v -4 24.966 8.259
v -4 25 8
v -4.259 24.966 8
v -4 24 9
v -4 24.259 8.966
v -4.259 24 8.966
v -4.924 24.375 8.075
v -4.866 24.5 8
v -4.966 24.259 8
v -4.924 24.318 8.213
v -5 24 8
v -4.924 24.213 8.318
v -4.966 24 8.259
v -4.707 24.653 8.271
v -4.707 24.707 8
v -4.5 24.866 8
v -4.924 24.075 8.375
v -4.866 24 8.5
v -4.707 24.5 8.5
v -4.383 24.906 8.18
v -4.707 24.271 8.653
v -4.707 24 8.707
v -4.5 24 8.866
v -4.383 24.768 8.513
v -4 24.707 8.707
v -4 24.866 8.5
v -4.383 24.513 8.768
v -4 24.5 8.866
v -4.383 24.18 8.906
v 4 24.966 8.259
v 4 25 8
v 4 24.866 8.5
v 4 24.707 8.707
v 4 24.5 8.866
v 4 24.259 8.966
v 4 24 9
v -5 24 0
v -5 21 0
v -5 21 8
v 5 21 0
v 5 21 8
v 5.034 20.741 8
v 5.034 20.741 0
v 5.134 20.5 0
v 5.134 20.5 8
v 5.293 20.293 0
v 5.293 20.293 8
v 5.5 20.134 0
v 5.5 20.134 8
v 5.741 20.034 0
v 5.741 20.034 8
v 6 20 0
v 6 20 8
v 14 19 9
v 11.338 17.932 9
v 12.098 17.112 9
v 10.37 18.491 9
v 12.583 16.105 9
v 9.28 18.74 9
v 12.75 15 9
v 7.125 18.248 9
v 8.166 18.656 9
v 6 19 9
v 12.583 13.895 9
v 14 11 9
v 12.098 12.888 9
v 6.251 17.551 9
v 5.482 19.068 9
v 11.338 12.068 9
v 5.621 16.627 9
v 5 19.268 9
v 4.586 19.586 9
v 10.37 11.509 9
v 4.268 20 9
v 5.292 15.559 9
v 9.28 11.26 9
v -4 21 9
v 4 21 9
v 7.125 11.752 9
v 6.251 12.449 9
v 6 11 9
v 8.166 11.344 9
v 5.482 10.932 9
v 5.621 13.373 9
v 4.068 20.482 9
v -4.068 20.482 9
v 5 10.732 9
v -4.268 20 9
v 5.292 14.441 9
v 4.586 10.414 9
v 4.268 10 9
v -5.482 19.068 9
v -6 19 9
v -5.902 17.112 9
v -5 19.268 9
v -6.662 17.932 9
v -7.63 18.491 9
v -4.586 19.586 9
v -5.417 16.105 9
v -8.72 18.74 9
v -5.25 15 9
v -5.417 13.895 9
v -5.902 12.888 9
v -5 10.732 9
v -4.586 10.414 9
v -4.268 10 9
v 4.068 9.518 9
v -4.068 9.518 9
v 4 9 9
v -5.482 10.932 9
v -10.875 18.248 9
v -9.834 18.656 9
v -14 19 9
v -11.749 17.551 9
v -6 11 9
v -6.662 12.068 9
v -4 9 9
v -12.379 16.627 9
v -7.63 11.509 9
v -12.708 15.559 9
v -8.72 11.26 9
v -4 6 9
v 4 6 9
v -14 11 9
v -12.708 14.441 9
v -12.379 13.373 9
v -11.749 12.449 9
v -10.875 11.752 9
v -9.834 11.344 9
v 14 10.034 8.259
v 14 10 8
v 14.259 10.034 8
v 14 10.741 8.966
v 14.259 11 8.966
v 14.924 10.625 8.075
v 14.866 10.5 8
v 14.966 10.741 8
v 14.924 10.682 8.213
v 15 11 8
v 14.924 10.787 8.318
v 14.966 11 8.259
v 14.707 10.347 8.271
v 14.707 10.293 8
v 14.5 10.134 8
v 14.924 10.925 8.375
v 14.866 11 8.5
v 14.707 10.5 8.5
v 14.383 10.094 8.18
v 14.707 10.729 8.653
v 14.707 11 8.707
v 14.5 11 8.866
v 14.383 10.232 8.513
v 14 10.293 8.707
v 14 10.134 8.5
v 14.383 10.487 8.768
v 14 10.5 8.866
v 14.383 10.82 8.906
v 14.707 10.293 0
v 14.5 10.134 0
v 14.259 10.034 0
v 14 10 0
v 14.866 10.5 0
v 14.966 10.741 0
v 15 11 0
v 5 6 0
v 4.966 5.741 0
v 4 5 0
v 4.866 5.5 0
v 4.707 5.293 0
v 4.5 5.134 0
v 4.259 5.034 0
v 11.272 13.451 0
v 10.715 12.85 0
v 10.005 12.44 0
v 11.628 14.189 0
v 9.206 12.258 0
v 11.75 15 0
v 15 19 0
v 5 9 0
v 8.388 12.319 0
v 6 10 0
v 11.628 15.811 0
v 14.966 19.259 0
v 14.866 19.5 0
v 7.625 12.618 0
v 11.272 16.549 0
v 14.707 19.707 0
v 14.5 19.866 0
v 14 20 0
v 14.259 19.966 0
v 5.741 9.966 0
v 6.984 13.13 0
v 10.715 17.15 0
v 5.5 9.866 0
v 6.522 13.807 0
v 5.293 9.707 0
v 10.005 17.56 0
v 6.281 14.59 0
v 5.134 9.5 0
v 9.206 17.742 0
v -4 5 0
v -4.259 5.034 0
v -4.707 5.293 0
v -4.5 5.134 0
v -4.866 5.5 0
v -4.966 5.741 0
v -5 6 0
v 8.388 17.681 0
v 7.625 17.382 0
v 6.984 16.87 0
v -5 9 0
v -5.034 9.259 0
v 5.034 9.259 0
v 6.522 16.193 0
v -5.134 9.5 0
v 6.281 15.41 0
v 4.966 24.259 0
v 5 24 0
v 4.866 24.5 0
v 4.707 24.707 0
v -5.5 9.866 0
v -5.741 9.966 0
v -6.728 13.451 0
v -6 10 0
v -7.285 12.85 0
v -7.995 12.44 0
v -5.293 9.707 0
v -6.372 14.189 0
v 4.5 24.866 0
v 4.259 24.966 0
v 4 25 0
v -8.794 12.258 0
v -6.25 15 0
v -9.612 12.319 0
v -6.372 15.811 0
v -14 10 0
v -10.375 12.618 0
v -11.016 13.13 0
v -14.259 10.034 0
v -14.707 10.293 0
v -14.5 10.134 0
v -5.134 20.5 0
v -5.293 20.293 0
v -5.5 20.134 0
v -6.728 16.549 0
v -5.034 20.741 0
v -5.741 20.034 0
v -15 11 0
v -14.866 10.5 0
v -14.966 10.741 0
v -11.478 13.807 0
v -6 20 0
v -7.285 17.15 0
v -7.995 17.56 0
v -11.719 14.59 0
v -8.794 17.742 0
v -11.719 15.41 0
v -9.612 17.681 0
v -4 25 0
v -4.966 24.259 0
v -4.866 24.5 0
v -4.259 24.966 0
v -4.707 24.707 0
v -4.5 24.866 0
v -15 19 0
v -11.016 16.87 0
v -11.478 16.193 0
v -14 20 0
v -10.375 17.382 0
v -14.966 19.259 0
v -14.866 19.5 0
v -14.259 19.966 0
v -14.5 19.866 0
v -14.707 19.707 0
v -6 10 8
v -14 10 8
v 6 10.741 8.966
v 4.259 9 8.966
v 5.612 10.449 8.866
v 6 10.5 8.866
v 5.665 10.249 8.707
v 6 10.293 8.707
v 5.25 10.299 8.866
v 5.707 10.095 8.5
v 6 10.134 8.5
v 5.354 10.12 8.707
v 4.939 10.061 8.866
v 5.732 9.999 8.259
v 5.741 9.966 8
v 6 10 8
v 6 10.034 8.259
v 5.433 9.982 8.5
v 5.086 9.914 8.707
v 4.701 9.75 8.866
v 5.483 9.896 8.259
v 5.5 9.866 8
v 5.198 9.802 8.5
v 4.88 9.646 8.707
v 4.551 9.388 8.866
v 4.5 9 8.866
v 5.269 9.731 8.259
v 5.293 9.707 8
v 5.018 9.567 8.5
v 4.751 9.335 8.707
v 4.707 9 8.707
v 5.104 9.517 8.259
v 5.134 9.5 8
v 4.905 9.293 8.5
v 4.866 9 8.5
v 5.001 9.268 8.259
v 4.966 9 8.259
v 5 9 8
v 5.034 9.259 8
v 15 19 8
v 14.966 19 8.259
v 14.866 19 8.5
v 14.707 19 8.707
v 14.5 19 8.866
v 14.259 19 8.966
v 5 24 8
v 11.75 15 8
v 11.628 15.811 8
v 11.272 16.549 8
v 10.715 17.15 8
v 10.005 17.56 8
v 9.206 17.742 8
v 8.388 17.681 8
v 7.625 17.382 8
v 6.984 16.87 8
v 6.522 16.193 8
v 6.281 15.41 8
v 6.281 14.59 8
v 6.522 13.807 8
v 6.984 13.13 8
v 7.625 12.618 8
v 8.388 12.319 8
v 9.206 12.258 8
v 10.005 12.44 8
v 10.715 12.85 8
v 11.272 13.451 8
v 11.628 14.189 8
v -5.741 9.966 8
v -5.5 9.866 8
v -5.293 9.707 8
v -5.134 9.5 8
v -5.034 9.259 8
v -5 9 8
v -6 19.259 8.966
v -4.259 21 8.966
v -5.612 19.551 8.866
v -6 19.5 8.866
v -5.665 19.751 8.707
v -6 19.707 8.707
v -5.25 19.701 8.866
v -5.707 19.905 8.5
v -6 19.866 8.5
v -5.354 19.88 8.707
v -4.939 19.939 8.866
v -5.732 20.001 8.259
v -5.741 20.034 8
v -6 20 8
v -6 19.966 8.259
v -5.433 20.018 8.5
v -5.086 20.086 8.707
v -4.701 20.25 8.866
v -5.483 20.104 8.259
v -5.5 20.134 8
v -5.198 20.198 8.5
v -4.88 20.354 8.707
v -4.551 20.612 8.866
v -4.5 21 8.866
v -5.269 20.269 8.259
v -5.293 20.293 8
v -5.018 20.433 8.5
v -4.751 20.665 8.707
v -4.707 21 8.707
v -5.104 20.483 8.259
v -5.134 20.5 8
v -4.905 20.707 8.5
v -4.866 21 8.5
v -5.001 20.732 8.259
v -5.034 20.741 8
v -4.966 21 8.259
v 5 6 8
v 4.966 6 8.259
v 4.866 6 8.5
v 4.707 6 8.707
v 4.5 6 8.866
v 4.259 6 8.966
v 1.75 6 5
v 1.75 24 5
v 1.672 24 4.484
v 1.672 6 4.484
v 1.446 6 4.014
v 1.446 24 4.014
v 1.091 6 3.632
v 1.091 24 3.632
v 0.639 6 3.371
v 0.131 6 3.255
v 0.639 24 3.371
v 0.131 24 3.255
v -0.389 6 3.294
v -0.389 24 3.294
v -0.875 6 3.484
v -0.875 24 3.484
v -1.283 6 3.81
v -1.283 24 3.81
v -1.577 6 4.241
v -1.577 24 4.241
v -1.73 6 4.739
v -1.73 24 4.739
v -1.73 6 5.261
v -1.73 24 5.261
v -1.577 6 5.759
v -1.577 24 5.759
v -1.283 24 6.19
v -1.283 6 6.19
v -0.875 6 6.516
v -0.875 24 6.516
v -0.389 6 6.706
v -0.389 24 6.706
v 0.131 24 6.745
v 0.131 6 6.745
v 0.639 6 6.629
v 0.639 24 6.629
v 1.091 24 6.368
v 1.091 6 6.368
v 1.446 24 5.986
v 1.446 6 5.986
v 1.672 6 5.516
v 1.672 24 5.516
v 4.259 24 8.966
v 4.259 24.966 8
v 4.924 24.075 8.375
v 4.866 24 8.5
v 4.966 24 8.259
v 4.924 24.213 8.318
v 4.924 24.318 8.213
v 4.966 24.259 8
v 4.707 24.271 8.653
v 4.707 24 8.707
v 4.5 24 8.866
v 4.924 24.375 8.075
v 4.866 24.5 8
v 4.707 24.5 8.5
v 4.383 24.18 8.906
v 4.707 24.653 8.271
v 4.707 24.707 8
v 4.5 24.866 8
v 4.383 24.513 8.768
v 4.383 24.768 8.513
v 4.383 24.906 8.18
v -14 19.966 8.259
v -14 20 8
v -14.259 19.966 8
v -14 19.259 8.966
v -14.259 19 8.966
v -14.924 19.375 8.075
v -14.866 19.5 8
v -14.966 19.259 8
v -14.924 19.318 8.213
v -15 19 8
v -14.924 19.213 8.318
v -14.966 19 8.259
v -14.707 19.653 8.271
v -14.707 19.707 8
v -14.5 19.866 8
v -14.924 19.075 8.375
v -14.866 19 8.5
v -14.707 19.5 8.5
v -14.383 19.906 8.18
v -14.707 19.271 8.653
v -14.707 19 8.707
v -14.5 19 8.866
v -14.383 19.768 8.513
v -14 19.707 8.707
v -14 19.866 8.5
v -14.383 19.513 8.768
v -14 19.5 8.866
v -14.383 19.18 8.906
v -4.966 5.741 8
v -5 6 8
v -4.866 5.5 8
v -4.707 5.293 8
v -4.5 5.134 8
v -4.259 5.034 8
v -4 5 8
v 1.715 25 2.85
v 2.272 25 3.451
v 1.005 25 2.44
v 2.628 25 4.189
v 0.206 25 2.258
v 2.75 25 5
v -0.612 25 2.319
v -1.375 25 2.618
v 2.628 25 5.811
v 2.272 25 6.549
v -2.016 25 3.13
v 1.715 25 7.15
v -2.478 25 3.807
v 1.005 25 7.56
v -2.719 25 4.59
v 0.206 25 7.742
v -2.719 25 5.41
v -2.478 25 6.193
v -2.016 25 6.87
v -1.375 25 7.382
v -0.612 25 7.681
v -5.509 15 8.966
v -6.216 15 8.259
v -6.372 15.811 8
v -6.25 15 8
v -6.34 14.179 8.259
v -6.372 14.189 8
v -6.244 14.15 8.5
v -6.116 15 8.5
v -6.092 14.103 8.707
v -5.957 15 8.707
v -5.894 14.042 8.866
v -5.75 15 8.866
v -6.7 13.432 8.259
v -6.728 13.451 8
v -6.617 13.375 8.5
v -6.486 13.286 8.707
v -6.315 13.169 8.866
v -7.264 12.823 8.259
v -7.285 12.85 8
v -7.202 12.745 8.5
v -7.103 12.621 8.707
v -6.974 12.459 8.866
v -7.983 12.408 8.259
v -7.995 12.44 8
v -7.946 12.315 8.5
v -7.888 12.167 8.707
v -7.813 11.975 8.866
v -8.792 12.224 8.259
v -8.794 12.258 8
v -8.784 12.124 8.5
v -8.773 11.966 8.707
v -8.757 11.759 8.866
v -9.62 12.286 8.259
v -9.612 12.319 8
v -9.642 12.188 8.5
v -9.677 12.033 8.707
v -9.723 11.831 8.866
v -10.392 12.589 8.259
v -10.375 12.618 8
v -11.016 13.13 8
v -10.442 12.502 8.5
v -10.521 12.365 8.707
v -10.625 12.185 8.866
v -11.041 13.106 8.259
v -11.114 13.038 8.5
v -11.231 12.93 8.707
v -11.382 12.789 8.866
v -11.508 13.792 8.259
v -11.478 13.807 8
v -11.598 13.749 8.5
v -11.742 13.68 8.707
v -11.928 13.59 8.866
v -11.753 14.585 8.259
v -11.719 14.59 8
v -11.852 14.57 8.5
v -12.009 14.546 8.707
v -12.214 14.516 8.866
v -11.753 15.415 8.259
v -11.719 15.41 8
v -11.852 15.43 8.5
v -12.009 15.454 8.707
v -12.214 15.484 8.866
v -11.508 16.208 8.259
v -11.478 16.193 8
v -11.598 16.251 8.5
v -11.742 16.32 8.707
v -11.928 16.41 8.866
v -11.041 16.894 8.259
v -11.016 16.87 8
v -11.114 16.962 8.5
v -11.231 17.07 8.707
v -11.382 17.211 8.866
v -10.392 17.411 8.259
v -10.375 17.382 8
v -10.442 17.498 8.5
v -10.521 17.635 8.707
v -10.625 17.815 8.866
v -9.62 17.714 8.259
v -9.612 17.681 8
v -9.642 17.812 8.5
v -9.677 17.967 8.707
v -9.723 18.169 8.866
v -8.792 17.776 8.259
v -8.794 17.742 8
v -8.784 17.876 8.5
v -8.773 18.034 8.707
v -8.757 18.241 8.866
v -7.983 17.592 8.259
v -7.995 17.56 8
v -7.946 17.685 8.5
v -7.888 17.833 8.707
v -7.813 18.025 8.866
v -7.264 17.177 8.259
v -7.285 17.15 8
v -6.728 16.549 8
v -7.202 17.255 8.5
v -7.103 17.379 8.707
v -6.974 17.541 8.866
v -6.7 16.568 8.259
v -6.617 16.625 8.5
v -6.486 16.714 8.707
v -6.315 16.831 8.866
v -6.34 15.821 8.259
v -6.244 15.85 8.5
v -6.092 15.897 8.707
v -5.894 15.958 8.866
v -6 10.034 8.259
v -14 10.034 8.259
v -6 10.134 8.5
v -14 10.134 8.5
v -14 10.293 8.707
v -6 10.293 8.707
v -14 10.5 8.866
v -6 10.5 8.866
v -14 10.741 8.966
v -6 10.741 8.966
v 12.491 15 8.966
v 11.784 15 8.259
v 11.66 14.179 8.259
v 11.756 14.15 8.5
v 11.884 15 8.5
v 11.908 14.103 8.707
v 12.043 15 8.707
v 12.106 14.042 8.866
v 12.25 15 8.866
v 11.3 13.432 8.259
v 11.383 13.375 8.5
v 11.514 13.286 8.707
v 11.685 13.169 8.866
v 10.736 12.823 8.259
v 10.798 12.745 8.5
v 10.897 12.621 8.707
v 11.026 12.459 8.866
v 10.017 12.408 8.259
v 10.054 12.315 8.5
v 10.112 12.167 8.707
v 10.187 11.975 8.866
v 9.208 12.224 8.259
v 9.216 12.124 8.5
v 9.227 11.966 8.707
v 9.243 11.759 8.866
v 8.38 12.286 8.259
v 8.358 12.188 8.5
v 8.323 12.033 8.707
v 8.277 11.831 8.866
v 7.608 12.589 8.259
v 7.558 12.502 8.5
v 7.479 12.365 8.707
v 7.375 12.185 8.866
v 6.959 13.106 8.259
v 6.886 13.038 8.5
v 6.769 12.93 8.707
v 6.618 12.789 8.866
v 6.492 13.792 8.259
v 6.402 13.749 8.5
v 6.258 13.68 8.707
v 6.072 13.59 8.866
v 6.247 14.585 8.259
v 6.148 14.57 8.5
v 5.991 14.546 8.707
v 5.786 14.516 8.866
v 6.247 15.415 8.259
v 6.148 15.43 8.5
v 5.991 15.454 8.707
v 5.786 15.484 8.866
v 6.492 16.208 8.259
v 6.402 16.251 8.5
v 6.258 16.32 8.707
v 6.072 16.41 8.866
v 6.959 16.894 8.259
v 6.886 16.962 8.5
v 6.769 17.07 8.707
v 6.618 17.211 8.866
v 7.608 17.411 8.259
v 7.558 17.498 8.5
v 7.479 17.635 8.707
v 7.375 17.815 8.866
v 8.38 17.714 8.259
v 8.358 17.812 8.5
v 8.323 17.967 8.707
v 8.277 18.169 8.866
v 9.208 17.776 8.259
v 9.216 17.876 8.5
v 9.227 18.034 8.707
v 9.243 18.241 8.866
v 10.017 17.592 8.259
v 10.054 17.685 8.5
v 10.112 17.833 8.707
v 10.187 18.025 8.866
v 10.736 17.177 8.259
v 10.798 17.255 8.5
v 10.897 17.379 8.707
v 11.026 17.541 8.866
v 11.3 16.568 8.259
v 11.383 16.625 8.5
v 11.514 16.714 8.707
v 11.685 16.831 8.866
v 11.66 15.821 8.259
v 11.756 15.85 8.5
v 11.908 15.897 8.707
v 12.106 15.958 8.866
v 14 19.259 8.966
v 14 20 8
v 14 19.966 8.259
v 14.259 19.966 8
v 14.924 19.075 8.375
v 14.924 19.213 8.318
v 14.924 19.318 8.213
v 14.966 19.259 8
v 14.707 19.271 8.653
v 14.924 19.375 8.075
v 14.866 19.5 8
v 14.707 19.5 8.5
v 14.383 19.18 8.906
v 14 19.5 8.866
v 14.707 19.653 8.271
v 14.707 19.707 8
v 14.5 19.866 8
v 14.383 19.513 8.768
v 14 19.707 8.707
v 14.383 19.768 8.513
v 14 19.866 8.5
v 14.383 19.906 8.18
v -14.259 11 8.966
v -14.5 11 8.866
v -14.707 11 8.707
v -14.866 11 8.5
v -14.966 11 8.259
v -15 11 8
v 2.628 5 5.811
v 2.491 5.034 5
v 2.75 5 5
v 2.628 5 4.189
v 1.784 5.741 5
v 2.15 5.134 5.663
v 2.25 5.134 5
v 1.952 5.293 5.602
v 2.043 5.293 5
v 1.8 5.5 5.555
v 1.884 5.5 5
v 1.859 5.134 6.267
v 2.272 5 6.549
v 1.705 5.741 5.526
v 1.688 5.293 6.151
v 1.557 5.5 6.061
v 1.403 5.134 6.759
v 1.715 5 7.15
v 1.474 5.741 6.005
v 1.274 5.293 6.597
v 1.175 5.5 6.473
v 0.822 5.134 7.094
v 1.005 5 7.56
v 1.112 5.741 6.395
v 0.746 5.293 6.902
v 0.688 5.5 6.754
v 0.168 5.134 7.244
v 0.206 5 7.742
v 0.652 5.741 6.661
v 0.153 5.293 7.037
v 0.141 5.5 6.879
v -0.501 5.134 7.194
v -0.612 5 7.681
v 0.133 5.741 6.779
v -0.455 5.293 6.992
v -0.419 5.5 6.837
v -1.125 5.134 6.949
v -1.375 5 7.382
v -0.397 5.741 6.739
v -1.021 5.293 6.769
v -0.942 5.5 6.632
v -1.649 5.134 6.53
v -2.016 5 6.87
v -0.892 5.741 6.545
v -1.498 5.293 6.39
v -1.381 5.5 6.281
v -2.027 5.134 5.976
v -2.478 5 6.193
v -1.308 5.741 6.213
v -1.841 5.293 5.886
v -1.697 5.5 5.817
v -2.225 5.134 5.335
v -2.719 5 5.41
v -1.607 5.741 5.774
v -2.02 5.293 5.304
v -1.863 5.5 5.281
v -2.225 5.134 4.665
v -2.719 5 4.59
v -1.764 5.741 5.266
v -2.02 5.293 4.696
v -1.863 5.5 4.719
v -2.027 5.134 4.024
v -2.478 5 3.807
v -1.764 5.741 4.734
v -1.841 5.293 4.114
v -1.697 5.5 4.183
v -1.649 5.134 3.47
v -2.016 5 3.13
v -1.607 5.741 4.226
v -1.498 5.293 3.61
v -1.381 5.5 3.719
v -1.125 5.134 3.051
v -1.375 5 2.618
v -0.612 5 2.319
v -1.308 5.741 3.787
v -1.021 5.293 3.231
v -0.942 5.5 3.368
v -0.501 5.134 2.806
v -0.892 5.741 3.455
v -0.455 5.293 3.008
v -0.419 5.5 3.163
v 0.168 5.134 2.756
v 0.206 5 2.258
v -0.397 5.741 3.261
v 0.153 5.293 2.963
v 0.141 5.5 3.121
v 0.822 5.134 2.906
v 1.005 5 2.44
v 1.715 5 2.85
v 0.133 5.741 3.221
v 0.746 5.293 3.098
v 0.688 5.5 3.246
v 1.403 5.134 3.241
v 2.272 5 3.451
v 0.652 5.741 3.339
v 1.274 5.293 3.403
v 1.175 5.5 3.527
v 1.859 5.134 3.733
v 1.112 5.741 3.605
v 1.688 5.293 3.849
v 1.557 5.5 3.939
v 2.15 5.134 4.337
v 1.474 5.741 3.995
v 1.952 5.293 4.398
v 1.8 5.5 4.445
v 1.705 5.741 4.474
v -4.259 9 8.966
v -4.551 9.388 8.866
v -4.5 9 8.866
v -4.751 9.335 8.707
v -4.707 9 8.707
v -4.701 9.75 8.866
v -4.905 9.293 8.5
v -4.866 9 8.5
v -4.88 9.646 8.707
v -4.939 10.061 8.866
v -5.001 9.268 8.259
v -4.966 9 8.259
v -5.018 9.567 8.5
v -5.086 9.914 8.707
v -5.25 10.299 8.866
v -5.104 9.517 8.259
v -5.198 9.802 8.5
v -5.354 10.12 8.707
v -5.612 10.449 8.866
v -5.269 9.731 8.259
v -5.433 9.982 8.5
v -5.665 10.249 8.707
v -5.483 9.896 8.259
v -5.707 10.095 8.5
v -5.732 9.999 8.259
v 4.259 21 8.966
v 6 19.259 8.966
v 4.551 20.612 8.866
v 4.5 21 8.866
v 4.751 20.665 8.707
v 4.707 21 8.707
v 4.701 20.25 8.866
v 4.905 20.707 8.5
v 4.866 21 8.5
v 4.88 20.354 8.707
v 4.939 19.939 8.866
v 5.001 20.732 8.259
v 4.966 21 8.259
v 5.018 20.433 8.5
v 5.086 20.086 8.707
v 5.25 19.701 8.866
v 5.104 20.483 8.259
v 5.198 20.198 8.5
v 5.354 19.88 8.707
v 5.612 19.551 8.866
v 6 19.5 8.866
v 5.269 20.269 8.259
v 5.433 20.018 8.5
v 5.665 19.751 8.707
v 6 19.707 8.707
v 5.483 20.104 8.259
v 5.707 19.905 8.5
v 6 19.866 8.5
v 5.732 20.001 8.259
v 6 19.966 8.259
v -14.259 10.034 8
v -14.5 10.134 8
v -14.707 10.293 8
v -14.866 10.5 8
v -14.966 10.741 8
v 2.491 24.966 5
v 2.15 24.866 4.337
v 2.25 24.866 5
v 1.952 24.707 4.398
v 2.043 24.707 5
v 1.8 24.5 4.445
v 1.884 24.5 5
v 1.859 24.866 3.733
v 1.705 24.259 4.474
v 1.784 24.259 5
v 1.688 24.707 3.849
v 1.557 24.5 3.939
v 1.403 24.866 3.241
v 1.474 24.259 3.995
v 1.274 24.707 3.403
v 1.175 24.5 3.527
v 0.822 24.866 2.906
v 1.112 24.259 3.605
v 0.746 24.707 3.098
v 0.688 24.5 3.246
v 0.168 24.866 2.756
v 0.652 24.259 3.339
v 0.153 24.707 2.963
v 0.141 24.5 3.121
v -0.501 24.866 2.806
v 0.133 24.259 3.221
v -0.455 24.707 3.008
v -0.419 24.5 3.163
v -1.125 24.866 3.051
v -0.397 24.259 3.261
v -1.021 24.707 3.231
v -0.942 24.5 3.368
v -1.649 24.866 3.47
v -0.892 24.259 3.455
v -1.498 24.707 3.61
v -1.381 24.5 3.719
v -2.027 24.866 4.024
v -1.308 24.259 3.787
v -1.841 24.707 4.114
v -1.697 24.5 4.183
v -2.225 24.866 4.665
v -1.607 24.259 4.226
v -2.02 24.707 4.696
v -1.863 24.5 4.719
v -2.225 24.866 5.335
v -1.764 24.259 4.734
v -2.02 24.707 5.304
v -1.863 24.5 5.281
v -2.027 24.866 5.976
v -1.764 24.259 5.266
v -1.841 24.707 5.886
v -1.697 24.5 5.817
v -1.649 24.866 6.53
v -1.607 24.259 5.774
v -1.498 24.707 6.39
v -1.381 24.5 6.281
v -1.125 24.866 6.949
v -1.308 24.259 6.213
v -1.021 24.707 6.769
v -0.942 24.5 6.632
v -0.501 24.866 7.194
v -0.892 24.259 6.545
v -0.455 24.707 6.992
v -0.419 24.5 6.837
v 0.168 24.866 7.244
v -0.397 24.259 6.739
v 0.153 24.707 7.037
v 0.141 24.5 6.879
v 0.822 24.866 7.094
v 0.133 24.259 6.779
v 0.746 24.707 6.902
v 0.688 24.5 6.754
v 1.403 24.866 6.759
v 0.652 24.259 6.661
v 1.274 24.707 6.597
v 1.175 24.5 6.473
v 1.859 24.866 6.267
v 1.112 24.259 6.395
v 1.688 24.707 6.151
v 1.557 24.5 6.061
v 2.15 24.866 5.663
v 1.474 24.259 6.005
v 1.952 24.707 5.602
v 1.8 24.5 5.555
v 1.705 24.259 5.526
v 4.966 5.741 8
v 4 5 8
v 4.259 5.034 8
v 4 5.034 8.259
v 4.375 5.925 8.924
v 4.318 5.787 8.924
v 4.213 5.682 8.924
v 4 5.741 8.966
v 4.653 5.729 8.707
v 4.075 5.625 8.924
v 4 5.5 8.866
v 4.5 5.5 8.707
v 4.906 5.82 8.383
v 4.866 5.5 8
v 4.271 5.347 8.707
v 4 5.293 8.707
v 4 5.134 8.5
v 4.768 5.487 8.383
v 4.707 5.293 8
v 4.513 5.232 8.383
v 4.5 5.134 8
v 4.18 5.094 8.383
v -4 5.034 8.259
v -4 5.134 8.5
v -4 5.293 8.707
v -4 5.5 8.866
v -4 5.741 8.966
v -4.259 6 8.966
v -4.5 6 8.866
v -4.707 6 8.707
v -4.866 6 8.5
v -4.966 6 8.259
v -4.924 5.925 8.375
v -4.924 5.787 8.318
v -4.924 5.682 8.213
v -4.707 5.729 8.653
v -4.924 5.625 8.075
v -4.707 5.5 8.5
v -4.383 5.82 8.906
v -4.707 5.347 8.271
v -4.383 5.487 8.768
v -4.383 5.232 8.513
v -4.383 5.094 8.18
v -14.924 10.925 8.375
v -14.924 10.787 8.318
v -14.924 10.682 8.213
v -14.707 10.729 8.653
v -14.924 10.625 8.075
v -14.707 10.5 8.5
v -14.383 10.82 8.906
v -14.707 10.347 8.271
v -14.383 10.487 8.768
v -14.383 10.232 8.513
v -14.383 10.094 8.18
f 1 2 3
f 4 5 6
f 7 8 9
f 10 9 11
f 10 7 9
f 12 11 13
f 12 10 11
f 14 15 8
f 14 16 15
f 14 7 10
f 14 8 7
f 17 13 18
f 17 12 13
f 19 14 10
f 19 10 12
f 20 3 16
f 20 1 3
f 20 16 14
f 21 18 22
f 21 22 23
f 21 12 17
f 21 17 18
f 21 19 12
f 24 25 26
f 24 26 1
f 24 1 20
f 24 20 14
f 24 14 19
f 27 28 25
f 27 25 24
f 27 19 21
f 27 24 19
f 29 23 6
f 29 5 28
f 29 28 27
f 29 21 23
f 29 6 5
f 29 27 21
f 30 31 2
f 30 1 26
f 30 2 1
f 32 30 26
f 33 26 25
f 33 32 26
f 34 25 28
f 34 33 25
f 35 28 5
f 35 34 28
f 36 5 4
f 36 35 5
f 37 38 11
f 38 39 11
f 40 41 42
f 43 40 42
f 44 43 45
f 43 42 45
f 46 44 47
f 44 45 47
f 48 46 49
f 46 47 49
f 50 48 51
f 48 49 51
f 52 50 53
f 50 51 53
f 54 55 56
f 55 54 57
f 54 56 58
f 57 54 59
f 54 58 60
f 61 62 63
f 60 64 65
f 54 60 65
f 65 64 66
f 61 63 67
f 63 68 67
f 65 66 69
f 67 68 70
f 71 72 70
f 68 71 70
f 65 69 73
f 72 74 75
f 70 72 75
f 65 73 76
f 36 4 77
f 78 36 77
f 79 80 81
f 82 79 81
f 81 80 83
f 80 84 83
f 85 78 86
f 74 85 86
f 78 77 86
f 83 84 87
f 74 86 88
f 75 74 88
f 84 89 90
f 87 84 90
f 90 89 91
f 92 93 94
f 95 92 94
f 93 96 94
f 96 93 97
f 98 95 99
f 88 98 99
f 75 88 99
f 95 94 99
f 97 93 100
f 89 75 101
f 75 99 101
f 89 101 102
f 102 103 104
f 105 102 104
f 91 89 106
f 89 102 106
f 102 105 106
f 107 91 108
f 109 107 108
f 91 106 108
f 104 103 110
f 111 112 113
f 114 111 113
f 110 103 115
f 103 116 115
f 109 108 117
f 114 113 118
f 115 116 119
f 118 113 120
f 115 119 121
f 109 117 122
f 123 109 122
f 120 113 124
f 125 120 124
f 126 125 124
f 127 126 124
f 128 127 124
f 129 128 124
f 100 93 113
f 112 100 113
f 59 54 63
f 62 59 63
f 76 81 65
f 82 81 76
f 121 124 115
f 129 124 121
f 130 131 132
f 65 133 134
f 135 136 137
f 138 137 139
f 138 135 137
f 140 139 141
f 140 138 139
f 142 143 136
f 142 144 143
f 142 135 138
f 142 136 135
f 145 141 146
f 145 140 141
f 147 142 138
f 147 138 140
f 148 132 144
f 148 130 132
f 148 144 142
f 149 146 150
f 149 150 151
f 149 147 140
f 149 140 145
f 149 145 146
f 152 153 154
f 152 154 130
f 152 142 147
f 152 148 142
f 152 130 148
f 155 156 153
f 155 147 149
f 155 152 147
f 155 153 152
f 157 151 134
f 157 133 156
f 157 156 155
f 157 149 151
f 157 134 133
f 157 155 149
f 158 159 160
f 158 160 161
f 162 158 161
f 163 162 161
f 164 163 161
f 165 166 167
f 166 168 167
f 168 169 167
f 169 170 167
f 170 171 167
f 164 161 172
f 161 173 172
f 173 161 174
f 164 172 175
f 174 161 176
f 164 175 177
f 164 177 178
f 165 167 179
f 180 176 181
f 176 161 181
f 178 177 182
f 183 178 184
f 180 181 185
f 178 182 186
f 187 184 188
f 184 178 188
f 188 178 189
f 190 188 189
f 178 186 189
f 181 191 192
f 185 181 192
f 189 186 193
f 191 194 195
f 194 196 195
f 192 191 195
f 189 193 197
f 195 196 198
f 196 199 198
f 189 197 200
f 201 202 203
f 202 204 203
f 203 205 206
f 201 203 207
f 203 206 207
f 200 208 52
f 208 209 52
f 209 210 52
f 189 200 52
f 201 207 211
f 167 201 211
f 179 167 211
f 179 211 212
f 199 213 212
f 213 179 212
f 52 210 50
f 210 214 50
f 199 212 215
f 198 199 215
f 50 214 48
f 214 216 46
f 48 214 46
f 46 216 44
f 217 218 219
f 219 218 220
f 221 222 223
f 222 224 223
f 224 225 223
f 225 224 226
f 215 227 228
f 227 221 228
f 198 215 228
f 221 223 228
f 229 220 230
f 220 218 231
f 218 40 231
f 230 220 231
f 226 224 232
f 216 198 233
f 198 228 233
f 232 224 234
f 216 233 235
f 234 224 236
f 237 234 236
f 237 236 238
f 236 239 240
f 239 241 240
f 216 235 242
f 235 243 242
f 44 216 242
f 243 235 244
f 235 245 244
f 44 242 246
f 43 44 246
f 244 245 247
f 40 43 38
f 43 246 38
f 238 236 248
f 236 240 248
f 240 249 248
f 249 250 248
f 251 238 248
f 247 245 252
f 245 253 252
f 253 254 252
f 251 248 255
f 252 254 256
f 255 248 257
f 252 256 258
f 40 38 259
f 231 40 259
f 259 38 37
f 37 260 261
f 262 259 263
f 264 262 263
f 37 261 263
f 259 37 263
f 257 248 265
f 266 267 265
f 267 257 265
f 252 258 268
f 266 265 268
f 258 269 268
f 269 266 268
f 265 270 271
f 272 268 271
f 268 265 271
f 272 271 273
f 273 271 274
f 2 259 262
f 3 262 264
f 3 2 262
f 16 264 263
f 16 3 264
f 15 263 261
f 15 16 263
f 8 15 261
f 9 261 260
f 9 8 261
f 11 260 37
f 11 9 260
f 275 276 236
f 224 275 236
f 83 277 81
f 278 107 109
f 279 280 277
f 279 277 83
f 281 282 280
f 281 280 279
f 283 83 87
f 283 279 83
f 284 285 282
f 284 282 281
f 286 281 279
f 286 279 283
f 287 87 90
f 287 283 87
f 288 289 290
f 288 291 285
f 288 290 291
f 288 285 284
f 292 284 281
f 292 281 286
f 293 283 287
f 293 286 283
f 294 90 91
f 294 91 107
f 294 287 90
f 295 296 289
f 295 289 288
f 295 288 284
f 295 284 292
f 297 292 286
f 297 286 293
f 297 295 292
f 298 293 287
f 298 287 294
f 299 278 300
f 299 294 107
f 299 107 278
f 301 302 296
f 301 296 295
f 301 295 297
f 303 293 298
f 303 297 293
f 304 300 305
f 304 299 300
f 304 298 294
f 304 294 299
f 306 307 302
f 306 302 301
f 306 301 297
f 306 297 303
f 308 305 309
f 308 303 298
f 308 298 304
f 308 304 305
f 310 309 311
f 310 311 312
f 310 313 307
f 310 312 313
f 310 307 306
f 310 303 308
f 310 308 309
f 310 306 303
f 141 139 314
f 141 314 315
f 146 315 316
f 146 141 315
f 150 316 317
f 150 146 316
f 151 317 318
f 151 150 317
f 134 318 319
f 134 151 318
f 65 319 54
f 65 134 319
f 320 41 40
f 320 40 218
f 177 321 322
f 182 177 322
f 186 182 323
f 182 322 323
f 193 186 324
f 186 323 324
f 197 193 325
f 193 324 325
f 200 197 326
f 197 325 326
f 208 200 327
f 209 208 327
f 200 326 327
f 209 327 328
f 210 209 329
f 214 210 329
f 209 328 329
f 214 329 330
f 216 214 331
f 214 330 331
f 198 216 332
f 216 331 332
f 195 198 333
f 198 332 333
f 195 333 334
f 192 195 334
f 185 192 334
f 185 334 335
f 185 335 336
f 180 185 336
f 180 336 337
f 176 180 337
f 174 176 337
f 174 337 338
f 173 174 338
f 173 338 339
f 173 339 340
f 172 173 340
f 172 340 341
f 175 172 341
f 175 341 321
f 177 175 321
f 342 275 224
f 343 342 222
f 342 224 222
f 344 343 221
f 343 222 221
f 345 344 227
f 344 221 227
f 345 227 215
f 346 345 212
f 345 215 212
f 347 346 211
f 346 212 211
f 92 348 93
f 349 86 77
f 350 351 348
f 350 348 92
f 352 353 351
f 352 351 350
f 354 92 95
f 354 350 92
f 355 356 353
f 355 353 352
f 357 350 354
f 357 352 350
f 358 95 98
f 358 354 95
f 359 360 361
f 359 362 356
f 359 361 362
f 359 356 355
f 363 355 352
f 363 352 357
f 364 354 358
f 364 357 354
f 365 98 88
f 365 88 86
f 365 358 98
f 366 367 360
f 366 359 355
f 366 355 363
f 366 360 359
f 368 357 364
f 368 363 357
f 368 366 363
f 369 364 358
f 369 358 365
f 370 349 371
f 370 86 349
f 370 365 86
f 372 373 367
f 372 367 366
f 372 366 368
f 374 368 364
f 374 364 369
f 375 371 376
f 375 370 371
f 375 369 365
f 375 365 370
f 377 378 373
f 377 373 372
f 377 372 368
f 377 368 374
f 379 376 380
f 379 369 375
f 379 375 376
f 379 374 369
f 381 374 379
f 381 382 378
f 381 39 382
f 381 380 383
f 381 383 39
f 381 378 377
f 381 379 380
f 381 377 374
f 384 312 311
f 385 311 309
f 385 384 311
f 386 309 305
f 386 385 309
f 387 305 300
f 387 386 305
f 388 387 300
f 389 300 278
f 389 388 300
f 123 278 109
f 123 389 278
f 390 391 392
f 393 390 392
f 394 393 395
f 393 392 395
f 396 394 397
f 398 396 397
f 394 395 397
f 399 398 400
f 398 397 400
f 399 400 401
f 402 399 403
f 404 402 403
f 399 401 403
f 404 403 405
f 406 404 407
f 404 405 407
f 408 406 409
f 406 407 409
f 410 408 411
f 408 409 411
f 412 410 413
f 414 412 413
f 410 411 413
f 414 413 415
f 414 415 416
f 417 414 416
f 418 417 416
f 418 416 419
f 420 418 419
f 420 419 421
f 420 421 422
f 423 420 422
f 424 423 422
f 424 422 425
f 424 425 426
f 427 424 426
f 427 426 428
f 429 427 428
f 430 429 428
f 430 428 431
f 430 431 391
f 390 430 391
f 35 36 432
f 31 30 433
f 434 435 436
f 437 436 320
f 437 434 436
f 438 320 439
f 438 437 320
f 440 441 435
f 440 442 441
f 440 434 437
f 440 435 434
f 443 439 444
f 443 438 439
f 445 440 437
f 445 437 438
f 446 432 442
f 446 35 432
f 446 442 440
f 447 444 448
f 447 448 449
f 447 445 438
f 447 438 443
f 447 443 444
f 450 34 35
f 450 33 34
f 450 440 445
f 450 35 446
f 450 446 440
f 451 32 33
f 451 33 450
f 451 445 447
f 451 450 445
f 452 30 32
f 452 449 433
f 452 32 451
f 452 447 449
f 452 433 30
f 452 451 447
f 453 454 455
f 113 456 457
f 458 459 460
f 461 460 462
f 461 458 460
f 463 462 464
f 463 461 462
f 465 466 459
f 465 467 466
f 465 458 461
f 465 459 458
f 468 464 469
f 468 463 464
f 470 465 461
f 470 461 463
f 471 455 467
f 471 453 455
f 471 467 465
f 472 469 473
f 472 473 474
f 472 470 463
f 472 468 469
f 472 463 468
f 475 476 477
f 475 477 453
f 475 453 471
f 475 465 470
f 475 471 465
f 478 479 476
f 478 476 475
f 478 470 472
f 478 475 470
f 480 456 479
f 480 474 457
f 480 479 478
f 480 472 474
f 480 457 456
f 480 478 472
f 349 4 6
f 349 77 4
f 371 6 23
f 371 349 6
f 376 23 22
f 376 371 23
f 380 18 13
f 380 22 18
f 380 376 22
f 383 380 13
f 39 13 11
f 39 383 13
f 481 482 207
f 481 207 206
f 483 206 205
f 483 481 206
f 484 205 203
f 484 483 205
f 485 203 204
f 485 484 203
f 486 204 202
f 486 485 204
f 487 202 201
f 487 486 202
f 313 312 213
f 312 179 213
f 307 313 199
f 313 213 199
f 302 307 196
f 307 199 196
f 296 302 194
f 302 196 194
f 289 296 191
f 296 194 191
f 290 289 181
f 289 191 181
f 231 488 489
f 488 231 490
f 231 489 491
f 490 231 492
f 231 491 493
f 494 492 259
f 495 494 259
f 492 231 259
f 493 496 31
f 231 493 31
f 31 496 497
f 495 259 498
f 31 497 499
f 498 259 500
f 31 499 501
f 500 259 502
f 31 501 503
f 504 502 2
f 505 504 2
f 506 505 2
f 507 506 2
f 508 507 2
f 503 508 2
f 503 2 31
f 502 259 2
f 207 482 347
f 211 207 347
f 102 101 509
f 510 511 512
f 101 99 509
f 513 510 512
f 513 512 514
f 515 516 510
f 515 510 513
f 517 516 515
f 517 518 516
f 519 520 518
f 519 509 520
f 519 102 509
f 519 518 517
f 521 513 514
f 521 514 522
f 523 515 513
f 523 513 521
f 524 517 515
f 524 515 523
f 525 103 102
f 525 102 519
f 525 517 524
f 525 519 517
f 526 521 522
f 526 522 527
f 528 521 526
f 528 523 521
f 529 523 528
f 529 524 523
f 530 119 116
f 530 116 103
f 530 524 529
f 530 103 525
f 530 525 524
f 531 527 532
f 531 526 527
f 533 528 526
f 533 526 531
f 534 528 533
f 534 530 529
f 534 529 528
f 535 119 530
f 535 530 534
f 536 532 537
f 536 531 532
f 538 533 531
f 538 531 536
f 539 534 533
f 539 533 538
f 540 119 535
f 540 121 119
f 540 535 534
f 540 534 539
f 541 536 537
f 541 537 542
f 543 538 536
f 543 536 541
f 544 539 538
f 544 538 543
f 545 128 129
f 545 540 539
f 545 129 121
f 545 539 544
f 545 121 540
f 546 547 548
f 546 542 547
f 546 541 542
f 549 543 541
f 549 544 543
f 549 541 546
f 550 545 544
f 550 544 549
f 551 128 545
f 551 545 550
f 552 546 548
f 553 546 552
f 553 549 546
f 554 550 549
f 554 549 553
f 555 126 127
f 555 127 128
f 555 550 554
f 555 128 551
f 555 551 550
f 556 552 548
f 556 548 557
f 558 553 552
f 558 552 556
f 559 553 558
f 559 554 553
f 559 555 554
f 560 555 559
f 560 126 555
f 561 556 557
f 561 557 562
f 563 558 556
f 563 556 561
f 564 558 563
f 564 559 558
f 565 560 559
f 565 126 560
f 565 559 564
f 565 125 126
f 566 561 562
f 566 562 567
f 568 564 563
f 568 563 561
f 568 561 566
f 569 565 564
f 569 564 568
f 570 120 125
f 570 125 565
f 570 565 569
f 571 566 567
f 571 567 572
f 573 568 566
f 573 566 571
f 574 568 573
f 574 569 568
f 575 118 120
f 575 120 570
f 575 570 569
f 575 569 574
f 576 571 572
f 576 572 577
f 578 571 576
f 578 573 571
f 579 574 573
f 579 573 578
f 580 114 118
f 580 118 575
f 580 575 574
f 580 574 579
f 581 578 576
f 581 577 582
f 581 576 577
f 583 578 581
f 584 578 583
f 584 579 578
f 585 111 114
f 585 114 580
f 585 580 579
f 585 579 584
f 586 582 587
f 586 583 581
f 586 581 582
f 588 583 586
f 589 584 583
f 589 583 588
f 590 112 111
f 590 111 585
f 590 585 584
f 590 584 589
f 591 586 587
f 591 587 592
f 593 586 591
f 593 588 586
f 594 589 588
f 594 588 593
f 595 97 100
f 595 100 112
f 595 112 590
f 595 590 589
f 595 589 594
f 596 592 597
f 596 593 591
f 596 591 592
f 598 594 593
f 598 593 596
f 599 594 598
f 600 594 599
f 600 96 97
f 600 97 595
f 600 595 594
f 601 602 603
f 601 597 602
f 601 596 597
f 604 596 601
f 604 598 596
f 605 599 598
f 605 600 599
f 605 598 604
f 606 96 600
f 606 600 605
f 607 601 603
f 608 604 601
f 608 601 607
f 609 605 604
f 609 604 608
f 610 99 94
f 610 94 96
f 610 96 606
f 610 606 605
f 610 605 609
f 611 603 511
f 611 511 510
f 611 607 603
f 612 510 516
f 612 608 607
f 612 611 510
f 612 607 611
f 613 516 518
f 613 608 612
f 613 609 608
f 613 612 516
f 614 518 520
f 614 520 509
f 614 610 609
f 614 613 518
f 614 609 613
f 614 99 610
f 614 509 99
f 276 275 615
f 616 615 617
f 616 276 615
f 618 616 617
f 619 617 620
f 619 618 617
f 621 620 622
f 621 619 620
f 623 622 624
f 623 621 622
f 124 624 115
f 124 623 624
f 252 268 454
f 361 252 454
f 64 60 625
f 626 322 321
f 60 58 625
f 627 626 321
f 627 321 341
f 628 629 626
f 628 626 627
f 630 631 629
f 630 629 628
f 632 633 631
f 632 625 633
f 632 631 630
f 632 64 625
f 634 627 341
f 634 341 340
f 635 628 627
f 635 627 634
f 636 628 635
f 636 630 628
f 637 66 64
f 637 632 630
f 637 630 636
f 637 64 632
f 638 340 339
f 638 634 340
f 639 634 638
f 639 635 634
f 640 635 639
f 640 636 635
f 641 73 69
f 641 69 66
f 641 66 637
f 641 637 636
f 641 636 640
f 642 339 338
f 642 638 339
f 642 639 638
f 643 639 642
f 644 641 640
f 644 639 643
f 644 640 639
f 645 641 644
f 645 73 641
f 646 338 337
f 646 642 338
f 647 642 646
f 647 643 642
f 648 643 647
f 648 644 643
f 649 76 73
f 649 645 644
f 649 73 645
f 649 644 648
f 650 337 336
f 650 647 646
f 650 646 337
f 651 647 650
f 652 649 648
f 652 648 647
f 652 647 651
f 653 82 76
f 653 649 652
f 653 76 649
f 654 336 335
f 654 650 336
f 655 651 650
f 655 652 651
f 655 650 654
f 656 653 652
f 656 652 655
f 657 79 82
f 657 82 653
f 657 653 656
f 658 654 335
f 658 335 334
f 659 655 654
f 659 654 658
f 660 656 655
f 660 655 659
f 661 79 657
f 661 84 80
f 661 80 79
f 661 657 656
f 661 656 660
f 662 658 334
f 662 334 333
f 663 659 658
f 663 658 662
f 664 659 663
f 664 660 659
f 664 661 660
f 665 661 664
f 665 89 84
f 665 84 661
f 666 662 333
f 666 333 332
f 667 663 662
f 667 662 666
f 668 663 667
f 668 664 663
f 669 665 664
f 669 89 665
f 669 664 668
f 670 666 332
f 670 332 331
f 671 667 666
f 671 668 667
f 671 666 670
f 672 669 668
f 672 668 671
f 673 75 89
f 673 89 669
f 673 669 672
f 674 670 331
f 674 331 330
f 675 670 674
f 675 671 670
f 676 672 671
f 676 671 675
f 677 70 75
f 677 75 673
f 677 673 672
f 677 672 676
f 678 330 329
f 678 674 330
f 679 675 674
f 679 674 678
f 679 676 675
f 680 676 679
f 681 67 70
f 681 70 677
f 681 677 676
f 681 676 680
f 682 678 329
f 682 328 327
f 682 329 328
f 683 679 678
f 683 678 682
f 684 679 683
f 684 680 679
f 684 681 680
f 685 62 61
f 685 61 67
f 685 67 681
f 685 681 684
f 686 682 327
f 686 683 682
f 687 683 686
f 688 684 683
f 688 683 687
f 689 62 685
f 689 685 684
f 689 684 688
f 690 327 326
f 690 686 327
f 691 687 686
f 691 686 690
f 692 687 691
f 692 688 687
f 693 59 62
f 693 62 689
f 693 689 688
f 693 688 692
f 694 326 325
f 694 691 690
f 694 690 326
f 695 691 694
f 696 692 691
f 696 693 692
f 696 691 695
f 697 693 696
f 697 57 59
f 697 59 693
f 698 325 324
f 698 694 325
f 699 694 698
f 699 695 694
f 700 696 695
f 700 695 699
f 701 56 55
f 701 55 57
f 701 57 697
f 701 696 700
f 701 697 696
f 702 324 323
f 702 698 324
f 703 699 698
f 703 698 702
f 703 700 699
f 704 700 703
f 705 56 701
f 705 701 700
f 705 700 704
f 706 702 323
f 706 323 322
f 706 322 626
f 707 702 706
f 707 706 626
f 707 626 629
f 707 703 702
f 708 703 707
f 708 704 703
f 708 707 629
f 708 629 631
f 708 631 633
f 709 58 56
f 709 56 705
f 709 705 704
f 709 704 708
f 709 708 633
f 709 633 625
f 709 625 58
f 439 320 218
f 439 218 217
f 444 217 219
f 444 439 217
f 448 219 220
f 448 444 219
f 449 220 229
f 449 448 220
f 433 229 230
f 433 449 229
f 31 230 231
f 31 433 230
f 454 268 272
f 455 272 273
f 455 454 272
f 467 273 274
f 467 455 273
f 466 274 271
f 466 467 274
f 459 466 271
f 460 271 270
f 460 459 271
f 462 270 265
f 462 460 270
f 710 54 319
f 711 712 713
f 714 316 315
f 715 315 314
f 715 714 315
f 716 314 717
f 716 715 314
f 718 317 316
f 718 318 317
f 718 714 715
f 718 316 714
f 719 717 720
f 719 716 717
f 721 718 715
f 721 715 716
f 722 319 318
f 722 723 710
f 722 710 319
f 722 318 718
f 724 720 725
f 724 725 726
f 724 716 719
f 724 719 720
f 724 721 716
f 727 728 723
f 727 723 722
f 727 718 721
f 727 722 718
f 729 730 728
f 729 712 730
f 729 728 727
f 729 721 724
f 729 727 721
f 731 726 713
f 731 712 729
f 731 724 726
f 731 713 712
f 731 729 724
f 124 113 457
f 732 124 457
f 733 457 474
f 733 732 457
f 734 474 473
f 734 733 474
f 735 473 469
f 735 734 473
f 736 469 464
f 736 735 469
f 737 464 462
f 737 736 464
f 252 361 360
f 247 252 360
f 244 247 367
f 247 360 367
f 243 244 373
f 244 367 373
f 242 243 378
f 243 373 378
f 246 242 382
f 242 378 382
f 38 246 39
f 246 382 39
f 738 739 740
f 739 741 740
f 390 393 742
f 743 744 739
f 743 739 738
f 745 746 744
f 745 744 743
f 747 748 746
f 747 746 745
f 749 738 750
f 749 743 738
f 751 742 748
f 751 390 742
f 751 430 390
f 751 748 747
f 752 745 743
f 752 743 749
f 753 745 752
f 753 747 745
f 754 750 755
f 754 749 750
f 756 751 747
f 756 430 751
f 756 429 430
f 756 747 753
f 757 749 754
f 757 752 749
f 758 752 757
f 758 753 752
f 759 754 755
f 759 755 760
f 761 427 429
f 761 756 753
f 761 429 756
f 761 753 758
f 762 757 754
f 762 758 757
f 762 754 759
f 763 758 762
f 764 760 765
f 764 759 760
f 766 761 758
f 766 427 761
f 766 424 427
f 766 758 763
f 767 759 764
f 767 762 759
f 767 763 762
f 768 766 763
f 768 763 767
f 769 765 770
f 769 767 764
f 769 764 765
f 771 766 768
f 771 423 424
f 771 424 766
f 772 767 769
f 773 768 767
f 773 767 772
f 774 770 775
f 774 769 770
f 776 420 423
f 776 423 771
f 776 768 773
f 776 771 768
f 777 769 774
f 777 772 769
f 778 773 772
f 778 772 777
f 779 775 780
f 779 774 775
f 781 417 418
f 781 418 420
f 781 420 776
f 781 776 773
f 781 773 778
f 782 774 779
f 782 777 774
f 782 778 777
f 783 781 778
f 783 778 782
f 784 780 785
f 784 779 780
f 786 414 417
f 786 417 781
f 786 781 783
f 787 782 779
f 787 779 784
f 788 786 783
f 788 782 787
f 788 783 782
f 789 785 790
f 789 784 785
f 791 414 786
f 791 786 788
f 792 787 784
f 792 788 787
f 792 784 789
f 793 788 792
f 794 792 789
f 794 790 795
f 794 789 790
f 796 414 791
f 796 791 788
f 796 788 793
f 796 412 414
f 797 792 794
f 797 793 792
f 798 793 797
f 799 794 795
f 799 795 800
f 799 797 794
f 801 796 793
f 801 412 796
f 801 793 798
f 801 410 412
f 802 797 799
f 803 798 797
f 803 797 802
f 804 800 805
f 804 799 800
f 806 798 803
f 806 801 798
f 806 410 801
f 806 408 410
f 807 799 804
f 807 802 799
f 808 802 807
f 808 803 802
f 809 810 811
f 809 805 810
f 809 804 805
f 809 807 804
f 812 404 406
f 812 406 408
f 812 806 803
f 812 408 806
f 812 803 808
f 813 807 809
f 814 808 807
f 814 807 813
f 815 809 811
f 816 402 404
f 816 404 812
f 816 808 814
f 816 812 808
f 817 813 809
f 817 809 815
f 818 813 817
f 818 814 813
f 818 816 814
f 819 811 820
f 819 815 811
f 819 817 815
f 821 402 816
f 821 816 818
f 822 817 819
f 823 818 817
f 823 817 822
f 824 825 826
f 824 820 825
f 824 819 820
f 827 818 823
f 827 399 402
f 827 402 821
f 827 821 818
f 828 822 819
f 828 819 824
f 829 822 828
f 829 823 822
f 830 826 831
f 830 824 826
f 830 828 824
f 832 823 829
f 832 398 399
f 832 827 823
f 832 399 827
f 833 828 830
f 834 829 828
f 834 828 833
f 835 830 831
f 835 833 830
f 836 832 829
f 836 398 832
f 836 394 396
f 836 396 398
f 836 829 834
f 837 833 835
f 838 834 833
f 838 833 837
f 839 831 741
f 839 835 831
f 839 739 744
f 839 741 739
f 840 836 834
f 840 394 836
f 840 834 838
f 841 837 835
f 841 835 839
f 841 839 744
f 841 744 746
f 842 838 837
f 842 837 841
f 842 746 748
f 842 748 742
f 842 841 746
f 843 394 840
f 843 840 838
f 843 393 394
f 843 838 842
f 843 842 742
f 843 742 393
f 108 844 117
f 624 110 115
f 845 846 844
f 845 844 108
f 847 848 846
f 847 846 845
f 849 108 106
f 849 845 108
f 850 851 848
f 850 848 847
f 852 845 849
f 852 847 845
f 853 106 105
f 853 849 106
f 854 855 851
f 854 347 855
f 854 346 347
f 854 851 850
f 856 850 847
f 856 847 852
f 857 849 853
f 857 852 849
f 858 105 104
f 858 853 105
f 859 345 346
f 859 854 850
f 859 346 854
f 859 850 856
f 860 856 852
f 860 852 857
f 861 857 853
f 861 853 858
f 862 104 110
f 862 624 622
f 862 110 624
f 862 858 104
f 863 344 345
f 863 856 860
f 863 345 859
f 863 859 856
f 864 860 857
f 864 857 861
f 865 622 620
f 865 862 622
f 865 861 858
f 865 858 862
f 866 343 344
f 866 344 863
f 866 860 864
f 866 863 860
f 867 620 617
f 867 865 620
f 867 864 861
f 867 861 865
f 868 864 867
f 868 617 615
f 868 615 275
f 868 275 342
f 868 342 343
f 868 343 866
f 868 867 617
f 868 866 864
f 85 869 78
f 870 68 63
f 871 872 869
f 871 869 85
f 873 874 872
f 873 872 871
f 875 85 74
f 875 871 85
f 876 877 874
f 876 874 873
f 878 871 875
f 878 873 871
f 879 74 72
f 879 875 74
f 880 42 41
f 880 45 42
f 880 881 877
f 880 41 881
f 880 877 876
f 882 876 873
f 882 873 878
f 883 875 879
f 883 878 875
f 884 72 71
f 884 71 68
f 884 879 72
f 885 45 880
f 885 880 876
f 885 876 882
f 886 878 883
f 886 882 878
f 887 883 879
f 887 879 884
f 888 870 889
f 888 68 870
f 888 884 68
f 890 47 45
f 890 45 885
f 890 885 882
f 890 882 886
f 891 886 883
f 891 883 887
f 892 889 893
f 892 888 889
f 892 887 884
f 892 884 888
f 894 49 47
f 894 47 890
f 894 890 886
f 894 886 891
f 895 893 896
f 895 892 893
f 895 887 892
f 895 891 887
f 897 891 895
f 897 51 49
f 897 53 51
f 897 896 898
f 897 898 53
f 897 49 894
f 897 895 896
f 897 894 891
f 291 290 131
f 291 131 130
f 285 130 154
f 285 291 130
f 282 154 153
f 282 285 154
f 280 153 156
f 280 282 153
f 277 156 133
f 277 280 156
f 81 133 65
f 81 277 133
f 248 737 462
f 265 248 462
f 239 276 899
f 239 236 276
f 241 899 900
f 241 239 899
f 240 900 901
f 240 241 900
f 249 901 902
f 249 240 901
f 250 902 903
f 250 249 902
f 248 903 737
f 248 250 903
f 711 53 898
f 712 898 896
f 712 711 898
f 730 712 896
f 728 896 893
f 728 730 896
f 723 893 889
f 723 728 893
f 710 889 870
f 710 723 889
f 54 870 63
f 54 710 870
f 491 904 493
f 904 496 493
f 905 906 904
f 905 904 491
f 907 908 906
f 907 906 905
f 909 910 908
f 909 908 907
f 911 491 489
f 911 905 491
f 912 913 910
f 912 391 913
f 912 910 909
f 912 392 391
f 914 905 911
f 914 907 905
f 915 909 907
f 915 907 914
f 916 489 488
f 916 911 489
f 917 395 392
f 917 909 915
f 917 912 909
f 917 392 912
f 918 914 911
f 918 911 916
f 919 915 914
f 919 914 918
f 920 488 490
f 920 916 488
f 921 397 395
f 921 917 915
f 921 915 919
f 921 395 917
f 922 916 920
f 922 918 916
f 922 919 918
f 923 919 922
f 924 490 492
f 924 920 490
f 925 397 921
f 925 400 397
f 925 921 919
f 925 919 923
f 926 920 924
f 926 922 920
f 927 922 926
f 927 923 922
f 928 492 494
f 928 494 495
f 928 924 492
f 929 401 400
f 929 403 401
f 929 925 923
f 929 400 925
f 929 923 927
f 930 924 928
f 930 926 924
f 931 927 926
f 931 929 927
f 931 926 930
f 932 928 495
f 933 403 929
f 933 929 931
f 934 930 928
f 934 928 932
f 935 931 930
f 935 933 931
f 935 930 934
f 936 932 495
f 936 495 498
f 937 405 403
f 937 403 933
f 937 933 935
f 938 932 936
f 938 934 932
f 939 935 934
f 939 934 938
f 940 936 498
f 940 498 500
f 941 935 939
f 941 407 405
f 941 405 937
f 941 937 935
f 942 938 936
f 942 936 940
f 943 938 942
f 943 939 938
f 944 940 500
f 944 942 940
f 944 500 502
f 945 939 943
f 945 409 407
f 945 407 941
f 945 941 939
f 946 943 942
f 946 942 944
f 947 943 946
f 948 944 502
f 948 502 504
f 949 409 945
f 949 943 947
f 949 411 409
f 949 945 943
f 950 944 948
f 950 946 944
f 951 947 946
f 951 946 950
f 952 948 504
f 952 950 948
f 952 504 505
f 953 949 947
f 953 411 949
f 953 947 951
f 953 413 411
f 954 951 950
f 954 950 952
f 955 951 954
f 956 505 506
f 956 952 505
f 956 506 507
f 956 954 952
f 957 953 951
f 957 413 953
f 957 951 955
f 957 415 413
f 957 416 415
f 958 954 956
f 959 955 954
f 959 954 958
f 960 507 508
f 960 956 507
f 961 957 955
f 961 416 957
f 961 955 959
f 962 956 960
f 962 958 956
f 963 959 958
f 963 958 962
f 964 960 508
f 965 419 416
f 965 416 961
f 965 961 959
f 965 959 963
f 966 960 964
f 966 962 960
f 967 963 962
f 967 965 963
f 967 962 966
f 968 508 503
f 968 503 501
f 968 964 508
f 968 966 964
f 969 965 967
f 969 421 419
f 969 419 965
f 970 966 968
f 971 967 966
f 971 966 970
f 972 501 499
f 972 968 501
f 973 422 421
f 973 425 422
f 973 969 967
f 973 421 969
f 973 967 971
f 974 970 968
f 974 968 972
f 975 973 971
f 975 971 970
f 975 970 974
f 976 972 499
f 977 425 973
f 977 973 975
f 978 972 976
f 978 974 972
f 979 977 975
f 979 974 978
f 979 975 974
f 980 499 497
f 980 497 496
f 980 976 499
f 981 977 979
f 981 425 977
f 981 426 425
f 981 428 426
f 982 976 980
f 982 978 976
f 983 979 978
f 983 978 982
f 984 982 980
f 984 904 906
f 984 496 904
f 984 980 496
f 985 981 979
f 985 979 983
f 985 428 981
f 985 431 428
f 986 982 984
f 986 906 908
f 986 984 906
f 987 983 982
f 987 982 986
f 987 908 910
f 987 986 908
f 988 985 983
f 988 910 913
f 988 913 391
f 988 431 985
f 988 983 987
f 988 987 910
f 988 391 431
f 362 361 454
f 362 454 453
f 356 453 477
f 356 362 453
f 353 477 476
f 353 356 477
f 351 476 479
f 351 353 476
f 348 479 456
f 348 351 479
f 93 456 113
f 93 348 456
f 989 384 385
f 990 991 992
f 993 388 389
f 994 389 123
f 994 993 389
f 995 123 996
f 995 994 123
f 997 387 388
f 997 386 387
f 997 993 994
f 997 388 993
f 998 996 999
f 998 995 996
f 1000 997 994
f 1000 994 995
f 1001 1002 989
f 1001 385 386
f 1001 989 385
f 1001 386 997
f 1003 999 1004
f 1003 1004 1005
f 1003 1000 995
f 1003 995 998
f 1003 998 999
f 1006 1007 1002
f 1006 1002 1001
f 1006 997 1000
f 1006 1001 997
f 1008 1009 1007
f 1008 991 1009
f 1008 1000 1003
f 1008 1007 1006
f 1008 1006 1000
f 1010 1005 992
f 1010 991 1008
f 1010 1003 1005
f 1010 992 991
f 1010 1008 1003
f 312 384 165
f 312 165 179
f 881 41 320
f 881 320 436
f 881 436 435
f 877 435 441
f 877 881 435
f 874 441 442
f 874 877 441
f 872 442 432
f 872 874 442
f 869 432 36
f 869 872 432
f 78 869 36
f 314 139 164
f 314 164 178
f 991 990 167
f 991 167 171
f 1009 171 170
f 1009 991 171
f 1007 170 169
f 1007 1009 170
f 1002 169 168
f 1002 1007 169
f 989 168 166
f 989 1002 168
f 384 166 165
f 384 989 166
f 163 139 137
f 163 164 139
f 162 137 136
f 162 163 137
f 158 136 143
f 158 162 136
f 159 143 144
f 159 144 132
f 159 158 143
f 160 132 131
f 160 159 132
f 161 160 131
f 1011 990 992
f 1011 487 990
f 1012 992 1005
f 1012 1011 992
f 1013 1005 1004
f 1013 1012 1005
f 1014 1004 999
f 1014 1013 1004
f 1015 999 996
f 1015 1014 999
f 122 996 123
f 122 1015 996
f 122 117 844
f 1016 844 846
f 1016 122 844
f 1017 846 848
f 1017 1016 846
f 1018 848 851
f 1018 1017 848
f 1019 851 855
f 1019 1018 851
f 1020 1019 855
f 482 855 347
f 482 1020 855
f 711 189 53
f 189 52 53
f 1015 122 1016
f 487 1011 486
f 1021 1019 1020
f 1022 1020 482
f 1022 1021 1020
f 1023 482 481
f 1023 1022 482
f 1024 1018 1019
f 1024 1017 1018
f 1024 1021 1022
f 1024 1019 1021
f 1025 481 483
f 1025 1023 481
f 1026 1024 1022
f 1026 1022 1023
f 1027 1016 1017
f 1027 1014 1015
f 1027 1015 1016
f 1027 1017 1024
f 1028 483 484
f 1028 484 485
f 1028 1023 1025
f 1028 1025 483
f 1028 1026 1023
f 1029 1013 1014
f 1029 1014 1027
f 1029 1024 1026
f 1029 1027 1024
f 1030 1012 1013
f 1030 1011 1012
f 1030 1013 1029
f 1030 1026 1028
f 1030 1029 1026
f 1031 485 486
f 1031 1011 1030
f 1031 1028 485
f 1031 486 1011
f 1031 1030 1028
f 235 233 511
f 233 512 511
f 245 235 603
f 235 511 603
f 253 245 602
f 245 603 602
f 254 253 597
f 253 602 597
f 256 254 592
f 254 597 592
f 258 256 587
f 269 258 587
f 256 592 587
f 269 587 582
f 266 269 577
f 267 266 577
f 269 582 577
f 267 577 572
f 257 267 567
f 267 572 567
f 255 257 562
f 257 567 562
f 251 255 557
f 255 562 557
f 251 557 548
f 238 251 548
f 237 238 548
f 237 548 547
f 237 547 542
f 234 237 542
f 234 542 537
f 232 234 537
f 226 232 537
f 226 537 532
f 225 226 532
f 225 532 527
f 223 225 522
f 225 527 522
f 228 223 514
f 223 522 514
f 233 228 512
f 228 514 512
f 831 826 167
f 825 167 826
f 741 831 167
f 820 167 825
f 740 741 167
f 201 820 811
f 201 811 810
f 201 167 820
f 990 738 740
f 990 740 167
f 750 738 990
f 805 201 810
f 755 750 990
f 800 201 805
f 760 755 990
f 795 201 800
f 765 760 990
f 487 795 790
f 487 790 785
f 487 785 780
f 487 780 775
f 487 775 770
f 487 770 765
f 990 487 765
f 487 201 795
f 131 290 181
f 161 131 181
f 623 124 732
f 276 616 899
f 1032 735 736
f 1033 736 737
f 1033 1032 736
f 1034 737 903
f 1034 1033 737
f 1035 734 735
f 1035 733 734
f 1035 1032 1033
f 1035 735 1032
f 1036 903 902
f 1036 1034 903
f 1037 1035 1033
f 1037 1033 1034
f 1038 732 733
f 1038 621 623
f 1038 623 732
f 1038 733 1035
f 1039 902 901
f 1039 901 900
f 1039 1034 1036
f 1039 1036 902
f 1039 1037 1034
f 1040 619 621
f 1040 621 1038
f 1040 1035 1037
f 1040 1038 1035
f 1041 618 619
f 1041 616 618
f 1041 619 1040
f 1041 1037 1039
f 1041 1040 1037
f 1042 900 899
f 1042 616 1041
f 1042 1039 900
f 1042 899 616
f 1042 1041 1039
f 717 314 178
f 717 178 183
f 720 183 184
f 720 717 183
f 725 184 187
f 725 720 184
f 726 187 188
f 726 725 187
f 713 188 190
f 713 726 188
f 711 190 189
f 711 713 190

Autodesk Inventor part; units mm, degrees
ref_plane "YZ Plane" through (0, 0, 0) normal (1, 0, 0) x (0, 1, 0)
ref_plane "XZ Plane" through (0, 0, 0) normal (0, 1, 0) x (-1, 0, 0)
ref_plane "XY Plane" through (0, 0, 0) normal (0, 0, 1) x (1, 0, 0)
sketch "Sketch1" plane through (0, 0, 0) normal (1, 0, 0) x (0, 1, 0)
  line L0 (25, 0) -> (25, 9)
  line L1 (25, 9) -> (0, 9)
  line L2 (0, 9) -> (0, 0)
  line L3 (0, 0) -> (20, 0) construction
  line L4 (5, 0) -> (25, 0)
  line L5 (20, 9) -> (10, 9)
  line L6 (10, 9) -> (10, 0)
  line L7 (10, 0) -> (20, 0)
  line L8 (20, 0) -> (20, 9)
  line L9 (20, 9) -> (10, 0) construction
  line L10 (10, 9) -> (20, 0) construction
  line L11 (5, 0) -> (5, 9)
  line L12 (5, 0) -> (0, 0)
  point P0 (15, 4.5)
  dimension "d8" = 9
  dimension "d13" = 10
  dimension "d14" = 9
  dimension "d15" = 25
  dimension "d39" = 10
  dimension "d47" = 5
extrude "Extrusion1" add sketch "Sketch1" along normal mid plane 10 contours L4 L8 L1 L0 | L4 L11 L1 L6
extrude "Extrusion2" add sketch "Sketch1" along normal mid plane 30 contours L4 L6 L1 L8
sketch "Sketch8" plane through (-5, 5, 9) normal (0, 0, 1) x (1, 0, 0)
  circle A0 centre (-4, 10) radius 2.75
  line L0 (-10, 5) -> (-10, 15) projected
  line L1 (-10, 15) -> (0, 15) projected
  circle A1 centre (14, 10) radius 2.75
  line L2 (20, 15) -> (20, 5) projected
  line L3 (10, 15) -> (20, 15) projected
  point P0 (5, -5)
  dimension "d48" = 5.5
  dimension "d49" = 6
  dimension "d50" = 5
  dimension "d51" = 5.5
  dimension "d52" = 6
  dimension "d53" = 5
extrude "Extrusion8" cut sketch "Sketch8" against normal through all
sketch "Sketch9" plane through (-5, 25, 9) normal (0, 1, 0) x (1, 0, 0)
  circle A0 centre (5, 4) radius 1.75
  line L0 (0, 9) -> (10, 9) projected
  line L1 (10, 9) -> (10, 0) projected
  line L2 (0, 0) -> (0, 9) projected
  point P0 (5, 9)
  dimension "d56" = 3.5
  dimension "d57" = 5
  dimension "d58" = 10
  dimension "d59" = 5
extrude "Extrusion9" cut sketch "Sketch9" against normal through all
fillet "Fillet4" radius 1 28 edges at (0, 25, 9) (-10, 20, 9) (-5, 22.5, 9) (5, 22.5, 9) (10, 20, 9) (5, 25, 4.5) (5, 20, 4.5) (-5, 25, 4.5) (-5, 20, 4.5) (10, 10, 9) (15, 15, 9) (15, 20, 4.5) (15, 10, 4.5) (5, 5, 4.5) (5, 7.5, 9) (5, 10, 4.5) (0, 5, 9) (-5, 7.5, 9) (-5, 10, 4.5) (-10, 10, 9) (-15, 15, 9) (-5, 5, 4.5) (-15, 10, 4.5) (-15, 20, 4.5) (6.25, 15, 9) (-11.75, 15, 9) (-1.75, 5, 5) (-1.75, 25, 5)
equation "\"d52\" = d49"
equation "\"d59\" = 0.5 * d58"
properties part number "bed_spring_holder_back_v2" material "Plastic, Opaque Black"
